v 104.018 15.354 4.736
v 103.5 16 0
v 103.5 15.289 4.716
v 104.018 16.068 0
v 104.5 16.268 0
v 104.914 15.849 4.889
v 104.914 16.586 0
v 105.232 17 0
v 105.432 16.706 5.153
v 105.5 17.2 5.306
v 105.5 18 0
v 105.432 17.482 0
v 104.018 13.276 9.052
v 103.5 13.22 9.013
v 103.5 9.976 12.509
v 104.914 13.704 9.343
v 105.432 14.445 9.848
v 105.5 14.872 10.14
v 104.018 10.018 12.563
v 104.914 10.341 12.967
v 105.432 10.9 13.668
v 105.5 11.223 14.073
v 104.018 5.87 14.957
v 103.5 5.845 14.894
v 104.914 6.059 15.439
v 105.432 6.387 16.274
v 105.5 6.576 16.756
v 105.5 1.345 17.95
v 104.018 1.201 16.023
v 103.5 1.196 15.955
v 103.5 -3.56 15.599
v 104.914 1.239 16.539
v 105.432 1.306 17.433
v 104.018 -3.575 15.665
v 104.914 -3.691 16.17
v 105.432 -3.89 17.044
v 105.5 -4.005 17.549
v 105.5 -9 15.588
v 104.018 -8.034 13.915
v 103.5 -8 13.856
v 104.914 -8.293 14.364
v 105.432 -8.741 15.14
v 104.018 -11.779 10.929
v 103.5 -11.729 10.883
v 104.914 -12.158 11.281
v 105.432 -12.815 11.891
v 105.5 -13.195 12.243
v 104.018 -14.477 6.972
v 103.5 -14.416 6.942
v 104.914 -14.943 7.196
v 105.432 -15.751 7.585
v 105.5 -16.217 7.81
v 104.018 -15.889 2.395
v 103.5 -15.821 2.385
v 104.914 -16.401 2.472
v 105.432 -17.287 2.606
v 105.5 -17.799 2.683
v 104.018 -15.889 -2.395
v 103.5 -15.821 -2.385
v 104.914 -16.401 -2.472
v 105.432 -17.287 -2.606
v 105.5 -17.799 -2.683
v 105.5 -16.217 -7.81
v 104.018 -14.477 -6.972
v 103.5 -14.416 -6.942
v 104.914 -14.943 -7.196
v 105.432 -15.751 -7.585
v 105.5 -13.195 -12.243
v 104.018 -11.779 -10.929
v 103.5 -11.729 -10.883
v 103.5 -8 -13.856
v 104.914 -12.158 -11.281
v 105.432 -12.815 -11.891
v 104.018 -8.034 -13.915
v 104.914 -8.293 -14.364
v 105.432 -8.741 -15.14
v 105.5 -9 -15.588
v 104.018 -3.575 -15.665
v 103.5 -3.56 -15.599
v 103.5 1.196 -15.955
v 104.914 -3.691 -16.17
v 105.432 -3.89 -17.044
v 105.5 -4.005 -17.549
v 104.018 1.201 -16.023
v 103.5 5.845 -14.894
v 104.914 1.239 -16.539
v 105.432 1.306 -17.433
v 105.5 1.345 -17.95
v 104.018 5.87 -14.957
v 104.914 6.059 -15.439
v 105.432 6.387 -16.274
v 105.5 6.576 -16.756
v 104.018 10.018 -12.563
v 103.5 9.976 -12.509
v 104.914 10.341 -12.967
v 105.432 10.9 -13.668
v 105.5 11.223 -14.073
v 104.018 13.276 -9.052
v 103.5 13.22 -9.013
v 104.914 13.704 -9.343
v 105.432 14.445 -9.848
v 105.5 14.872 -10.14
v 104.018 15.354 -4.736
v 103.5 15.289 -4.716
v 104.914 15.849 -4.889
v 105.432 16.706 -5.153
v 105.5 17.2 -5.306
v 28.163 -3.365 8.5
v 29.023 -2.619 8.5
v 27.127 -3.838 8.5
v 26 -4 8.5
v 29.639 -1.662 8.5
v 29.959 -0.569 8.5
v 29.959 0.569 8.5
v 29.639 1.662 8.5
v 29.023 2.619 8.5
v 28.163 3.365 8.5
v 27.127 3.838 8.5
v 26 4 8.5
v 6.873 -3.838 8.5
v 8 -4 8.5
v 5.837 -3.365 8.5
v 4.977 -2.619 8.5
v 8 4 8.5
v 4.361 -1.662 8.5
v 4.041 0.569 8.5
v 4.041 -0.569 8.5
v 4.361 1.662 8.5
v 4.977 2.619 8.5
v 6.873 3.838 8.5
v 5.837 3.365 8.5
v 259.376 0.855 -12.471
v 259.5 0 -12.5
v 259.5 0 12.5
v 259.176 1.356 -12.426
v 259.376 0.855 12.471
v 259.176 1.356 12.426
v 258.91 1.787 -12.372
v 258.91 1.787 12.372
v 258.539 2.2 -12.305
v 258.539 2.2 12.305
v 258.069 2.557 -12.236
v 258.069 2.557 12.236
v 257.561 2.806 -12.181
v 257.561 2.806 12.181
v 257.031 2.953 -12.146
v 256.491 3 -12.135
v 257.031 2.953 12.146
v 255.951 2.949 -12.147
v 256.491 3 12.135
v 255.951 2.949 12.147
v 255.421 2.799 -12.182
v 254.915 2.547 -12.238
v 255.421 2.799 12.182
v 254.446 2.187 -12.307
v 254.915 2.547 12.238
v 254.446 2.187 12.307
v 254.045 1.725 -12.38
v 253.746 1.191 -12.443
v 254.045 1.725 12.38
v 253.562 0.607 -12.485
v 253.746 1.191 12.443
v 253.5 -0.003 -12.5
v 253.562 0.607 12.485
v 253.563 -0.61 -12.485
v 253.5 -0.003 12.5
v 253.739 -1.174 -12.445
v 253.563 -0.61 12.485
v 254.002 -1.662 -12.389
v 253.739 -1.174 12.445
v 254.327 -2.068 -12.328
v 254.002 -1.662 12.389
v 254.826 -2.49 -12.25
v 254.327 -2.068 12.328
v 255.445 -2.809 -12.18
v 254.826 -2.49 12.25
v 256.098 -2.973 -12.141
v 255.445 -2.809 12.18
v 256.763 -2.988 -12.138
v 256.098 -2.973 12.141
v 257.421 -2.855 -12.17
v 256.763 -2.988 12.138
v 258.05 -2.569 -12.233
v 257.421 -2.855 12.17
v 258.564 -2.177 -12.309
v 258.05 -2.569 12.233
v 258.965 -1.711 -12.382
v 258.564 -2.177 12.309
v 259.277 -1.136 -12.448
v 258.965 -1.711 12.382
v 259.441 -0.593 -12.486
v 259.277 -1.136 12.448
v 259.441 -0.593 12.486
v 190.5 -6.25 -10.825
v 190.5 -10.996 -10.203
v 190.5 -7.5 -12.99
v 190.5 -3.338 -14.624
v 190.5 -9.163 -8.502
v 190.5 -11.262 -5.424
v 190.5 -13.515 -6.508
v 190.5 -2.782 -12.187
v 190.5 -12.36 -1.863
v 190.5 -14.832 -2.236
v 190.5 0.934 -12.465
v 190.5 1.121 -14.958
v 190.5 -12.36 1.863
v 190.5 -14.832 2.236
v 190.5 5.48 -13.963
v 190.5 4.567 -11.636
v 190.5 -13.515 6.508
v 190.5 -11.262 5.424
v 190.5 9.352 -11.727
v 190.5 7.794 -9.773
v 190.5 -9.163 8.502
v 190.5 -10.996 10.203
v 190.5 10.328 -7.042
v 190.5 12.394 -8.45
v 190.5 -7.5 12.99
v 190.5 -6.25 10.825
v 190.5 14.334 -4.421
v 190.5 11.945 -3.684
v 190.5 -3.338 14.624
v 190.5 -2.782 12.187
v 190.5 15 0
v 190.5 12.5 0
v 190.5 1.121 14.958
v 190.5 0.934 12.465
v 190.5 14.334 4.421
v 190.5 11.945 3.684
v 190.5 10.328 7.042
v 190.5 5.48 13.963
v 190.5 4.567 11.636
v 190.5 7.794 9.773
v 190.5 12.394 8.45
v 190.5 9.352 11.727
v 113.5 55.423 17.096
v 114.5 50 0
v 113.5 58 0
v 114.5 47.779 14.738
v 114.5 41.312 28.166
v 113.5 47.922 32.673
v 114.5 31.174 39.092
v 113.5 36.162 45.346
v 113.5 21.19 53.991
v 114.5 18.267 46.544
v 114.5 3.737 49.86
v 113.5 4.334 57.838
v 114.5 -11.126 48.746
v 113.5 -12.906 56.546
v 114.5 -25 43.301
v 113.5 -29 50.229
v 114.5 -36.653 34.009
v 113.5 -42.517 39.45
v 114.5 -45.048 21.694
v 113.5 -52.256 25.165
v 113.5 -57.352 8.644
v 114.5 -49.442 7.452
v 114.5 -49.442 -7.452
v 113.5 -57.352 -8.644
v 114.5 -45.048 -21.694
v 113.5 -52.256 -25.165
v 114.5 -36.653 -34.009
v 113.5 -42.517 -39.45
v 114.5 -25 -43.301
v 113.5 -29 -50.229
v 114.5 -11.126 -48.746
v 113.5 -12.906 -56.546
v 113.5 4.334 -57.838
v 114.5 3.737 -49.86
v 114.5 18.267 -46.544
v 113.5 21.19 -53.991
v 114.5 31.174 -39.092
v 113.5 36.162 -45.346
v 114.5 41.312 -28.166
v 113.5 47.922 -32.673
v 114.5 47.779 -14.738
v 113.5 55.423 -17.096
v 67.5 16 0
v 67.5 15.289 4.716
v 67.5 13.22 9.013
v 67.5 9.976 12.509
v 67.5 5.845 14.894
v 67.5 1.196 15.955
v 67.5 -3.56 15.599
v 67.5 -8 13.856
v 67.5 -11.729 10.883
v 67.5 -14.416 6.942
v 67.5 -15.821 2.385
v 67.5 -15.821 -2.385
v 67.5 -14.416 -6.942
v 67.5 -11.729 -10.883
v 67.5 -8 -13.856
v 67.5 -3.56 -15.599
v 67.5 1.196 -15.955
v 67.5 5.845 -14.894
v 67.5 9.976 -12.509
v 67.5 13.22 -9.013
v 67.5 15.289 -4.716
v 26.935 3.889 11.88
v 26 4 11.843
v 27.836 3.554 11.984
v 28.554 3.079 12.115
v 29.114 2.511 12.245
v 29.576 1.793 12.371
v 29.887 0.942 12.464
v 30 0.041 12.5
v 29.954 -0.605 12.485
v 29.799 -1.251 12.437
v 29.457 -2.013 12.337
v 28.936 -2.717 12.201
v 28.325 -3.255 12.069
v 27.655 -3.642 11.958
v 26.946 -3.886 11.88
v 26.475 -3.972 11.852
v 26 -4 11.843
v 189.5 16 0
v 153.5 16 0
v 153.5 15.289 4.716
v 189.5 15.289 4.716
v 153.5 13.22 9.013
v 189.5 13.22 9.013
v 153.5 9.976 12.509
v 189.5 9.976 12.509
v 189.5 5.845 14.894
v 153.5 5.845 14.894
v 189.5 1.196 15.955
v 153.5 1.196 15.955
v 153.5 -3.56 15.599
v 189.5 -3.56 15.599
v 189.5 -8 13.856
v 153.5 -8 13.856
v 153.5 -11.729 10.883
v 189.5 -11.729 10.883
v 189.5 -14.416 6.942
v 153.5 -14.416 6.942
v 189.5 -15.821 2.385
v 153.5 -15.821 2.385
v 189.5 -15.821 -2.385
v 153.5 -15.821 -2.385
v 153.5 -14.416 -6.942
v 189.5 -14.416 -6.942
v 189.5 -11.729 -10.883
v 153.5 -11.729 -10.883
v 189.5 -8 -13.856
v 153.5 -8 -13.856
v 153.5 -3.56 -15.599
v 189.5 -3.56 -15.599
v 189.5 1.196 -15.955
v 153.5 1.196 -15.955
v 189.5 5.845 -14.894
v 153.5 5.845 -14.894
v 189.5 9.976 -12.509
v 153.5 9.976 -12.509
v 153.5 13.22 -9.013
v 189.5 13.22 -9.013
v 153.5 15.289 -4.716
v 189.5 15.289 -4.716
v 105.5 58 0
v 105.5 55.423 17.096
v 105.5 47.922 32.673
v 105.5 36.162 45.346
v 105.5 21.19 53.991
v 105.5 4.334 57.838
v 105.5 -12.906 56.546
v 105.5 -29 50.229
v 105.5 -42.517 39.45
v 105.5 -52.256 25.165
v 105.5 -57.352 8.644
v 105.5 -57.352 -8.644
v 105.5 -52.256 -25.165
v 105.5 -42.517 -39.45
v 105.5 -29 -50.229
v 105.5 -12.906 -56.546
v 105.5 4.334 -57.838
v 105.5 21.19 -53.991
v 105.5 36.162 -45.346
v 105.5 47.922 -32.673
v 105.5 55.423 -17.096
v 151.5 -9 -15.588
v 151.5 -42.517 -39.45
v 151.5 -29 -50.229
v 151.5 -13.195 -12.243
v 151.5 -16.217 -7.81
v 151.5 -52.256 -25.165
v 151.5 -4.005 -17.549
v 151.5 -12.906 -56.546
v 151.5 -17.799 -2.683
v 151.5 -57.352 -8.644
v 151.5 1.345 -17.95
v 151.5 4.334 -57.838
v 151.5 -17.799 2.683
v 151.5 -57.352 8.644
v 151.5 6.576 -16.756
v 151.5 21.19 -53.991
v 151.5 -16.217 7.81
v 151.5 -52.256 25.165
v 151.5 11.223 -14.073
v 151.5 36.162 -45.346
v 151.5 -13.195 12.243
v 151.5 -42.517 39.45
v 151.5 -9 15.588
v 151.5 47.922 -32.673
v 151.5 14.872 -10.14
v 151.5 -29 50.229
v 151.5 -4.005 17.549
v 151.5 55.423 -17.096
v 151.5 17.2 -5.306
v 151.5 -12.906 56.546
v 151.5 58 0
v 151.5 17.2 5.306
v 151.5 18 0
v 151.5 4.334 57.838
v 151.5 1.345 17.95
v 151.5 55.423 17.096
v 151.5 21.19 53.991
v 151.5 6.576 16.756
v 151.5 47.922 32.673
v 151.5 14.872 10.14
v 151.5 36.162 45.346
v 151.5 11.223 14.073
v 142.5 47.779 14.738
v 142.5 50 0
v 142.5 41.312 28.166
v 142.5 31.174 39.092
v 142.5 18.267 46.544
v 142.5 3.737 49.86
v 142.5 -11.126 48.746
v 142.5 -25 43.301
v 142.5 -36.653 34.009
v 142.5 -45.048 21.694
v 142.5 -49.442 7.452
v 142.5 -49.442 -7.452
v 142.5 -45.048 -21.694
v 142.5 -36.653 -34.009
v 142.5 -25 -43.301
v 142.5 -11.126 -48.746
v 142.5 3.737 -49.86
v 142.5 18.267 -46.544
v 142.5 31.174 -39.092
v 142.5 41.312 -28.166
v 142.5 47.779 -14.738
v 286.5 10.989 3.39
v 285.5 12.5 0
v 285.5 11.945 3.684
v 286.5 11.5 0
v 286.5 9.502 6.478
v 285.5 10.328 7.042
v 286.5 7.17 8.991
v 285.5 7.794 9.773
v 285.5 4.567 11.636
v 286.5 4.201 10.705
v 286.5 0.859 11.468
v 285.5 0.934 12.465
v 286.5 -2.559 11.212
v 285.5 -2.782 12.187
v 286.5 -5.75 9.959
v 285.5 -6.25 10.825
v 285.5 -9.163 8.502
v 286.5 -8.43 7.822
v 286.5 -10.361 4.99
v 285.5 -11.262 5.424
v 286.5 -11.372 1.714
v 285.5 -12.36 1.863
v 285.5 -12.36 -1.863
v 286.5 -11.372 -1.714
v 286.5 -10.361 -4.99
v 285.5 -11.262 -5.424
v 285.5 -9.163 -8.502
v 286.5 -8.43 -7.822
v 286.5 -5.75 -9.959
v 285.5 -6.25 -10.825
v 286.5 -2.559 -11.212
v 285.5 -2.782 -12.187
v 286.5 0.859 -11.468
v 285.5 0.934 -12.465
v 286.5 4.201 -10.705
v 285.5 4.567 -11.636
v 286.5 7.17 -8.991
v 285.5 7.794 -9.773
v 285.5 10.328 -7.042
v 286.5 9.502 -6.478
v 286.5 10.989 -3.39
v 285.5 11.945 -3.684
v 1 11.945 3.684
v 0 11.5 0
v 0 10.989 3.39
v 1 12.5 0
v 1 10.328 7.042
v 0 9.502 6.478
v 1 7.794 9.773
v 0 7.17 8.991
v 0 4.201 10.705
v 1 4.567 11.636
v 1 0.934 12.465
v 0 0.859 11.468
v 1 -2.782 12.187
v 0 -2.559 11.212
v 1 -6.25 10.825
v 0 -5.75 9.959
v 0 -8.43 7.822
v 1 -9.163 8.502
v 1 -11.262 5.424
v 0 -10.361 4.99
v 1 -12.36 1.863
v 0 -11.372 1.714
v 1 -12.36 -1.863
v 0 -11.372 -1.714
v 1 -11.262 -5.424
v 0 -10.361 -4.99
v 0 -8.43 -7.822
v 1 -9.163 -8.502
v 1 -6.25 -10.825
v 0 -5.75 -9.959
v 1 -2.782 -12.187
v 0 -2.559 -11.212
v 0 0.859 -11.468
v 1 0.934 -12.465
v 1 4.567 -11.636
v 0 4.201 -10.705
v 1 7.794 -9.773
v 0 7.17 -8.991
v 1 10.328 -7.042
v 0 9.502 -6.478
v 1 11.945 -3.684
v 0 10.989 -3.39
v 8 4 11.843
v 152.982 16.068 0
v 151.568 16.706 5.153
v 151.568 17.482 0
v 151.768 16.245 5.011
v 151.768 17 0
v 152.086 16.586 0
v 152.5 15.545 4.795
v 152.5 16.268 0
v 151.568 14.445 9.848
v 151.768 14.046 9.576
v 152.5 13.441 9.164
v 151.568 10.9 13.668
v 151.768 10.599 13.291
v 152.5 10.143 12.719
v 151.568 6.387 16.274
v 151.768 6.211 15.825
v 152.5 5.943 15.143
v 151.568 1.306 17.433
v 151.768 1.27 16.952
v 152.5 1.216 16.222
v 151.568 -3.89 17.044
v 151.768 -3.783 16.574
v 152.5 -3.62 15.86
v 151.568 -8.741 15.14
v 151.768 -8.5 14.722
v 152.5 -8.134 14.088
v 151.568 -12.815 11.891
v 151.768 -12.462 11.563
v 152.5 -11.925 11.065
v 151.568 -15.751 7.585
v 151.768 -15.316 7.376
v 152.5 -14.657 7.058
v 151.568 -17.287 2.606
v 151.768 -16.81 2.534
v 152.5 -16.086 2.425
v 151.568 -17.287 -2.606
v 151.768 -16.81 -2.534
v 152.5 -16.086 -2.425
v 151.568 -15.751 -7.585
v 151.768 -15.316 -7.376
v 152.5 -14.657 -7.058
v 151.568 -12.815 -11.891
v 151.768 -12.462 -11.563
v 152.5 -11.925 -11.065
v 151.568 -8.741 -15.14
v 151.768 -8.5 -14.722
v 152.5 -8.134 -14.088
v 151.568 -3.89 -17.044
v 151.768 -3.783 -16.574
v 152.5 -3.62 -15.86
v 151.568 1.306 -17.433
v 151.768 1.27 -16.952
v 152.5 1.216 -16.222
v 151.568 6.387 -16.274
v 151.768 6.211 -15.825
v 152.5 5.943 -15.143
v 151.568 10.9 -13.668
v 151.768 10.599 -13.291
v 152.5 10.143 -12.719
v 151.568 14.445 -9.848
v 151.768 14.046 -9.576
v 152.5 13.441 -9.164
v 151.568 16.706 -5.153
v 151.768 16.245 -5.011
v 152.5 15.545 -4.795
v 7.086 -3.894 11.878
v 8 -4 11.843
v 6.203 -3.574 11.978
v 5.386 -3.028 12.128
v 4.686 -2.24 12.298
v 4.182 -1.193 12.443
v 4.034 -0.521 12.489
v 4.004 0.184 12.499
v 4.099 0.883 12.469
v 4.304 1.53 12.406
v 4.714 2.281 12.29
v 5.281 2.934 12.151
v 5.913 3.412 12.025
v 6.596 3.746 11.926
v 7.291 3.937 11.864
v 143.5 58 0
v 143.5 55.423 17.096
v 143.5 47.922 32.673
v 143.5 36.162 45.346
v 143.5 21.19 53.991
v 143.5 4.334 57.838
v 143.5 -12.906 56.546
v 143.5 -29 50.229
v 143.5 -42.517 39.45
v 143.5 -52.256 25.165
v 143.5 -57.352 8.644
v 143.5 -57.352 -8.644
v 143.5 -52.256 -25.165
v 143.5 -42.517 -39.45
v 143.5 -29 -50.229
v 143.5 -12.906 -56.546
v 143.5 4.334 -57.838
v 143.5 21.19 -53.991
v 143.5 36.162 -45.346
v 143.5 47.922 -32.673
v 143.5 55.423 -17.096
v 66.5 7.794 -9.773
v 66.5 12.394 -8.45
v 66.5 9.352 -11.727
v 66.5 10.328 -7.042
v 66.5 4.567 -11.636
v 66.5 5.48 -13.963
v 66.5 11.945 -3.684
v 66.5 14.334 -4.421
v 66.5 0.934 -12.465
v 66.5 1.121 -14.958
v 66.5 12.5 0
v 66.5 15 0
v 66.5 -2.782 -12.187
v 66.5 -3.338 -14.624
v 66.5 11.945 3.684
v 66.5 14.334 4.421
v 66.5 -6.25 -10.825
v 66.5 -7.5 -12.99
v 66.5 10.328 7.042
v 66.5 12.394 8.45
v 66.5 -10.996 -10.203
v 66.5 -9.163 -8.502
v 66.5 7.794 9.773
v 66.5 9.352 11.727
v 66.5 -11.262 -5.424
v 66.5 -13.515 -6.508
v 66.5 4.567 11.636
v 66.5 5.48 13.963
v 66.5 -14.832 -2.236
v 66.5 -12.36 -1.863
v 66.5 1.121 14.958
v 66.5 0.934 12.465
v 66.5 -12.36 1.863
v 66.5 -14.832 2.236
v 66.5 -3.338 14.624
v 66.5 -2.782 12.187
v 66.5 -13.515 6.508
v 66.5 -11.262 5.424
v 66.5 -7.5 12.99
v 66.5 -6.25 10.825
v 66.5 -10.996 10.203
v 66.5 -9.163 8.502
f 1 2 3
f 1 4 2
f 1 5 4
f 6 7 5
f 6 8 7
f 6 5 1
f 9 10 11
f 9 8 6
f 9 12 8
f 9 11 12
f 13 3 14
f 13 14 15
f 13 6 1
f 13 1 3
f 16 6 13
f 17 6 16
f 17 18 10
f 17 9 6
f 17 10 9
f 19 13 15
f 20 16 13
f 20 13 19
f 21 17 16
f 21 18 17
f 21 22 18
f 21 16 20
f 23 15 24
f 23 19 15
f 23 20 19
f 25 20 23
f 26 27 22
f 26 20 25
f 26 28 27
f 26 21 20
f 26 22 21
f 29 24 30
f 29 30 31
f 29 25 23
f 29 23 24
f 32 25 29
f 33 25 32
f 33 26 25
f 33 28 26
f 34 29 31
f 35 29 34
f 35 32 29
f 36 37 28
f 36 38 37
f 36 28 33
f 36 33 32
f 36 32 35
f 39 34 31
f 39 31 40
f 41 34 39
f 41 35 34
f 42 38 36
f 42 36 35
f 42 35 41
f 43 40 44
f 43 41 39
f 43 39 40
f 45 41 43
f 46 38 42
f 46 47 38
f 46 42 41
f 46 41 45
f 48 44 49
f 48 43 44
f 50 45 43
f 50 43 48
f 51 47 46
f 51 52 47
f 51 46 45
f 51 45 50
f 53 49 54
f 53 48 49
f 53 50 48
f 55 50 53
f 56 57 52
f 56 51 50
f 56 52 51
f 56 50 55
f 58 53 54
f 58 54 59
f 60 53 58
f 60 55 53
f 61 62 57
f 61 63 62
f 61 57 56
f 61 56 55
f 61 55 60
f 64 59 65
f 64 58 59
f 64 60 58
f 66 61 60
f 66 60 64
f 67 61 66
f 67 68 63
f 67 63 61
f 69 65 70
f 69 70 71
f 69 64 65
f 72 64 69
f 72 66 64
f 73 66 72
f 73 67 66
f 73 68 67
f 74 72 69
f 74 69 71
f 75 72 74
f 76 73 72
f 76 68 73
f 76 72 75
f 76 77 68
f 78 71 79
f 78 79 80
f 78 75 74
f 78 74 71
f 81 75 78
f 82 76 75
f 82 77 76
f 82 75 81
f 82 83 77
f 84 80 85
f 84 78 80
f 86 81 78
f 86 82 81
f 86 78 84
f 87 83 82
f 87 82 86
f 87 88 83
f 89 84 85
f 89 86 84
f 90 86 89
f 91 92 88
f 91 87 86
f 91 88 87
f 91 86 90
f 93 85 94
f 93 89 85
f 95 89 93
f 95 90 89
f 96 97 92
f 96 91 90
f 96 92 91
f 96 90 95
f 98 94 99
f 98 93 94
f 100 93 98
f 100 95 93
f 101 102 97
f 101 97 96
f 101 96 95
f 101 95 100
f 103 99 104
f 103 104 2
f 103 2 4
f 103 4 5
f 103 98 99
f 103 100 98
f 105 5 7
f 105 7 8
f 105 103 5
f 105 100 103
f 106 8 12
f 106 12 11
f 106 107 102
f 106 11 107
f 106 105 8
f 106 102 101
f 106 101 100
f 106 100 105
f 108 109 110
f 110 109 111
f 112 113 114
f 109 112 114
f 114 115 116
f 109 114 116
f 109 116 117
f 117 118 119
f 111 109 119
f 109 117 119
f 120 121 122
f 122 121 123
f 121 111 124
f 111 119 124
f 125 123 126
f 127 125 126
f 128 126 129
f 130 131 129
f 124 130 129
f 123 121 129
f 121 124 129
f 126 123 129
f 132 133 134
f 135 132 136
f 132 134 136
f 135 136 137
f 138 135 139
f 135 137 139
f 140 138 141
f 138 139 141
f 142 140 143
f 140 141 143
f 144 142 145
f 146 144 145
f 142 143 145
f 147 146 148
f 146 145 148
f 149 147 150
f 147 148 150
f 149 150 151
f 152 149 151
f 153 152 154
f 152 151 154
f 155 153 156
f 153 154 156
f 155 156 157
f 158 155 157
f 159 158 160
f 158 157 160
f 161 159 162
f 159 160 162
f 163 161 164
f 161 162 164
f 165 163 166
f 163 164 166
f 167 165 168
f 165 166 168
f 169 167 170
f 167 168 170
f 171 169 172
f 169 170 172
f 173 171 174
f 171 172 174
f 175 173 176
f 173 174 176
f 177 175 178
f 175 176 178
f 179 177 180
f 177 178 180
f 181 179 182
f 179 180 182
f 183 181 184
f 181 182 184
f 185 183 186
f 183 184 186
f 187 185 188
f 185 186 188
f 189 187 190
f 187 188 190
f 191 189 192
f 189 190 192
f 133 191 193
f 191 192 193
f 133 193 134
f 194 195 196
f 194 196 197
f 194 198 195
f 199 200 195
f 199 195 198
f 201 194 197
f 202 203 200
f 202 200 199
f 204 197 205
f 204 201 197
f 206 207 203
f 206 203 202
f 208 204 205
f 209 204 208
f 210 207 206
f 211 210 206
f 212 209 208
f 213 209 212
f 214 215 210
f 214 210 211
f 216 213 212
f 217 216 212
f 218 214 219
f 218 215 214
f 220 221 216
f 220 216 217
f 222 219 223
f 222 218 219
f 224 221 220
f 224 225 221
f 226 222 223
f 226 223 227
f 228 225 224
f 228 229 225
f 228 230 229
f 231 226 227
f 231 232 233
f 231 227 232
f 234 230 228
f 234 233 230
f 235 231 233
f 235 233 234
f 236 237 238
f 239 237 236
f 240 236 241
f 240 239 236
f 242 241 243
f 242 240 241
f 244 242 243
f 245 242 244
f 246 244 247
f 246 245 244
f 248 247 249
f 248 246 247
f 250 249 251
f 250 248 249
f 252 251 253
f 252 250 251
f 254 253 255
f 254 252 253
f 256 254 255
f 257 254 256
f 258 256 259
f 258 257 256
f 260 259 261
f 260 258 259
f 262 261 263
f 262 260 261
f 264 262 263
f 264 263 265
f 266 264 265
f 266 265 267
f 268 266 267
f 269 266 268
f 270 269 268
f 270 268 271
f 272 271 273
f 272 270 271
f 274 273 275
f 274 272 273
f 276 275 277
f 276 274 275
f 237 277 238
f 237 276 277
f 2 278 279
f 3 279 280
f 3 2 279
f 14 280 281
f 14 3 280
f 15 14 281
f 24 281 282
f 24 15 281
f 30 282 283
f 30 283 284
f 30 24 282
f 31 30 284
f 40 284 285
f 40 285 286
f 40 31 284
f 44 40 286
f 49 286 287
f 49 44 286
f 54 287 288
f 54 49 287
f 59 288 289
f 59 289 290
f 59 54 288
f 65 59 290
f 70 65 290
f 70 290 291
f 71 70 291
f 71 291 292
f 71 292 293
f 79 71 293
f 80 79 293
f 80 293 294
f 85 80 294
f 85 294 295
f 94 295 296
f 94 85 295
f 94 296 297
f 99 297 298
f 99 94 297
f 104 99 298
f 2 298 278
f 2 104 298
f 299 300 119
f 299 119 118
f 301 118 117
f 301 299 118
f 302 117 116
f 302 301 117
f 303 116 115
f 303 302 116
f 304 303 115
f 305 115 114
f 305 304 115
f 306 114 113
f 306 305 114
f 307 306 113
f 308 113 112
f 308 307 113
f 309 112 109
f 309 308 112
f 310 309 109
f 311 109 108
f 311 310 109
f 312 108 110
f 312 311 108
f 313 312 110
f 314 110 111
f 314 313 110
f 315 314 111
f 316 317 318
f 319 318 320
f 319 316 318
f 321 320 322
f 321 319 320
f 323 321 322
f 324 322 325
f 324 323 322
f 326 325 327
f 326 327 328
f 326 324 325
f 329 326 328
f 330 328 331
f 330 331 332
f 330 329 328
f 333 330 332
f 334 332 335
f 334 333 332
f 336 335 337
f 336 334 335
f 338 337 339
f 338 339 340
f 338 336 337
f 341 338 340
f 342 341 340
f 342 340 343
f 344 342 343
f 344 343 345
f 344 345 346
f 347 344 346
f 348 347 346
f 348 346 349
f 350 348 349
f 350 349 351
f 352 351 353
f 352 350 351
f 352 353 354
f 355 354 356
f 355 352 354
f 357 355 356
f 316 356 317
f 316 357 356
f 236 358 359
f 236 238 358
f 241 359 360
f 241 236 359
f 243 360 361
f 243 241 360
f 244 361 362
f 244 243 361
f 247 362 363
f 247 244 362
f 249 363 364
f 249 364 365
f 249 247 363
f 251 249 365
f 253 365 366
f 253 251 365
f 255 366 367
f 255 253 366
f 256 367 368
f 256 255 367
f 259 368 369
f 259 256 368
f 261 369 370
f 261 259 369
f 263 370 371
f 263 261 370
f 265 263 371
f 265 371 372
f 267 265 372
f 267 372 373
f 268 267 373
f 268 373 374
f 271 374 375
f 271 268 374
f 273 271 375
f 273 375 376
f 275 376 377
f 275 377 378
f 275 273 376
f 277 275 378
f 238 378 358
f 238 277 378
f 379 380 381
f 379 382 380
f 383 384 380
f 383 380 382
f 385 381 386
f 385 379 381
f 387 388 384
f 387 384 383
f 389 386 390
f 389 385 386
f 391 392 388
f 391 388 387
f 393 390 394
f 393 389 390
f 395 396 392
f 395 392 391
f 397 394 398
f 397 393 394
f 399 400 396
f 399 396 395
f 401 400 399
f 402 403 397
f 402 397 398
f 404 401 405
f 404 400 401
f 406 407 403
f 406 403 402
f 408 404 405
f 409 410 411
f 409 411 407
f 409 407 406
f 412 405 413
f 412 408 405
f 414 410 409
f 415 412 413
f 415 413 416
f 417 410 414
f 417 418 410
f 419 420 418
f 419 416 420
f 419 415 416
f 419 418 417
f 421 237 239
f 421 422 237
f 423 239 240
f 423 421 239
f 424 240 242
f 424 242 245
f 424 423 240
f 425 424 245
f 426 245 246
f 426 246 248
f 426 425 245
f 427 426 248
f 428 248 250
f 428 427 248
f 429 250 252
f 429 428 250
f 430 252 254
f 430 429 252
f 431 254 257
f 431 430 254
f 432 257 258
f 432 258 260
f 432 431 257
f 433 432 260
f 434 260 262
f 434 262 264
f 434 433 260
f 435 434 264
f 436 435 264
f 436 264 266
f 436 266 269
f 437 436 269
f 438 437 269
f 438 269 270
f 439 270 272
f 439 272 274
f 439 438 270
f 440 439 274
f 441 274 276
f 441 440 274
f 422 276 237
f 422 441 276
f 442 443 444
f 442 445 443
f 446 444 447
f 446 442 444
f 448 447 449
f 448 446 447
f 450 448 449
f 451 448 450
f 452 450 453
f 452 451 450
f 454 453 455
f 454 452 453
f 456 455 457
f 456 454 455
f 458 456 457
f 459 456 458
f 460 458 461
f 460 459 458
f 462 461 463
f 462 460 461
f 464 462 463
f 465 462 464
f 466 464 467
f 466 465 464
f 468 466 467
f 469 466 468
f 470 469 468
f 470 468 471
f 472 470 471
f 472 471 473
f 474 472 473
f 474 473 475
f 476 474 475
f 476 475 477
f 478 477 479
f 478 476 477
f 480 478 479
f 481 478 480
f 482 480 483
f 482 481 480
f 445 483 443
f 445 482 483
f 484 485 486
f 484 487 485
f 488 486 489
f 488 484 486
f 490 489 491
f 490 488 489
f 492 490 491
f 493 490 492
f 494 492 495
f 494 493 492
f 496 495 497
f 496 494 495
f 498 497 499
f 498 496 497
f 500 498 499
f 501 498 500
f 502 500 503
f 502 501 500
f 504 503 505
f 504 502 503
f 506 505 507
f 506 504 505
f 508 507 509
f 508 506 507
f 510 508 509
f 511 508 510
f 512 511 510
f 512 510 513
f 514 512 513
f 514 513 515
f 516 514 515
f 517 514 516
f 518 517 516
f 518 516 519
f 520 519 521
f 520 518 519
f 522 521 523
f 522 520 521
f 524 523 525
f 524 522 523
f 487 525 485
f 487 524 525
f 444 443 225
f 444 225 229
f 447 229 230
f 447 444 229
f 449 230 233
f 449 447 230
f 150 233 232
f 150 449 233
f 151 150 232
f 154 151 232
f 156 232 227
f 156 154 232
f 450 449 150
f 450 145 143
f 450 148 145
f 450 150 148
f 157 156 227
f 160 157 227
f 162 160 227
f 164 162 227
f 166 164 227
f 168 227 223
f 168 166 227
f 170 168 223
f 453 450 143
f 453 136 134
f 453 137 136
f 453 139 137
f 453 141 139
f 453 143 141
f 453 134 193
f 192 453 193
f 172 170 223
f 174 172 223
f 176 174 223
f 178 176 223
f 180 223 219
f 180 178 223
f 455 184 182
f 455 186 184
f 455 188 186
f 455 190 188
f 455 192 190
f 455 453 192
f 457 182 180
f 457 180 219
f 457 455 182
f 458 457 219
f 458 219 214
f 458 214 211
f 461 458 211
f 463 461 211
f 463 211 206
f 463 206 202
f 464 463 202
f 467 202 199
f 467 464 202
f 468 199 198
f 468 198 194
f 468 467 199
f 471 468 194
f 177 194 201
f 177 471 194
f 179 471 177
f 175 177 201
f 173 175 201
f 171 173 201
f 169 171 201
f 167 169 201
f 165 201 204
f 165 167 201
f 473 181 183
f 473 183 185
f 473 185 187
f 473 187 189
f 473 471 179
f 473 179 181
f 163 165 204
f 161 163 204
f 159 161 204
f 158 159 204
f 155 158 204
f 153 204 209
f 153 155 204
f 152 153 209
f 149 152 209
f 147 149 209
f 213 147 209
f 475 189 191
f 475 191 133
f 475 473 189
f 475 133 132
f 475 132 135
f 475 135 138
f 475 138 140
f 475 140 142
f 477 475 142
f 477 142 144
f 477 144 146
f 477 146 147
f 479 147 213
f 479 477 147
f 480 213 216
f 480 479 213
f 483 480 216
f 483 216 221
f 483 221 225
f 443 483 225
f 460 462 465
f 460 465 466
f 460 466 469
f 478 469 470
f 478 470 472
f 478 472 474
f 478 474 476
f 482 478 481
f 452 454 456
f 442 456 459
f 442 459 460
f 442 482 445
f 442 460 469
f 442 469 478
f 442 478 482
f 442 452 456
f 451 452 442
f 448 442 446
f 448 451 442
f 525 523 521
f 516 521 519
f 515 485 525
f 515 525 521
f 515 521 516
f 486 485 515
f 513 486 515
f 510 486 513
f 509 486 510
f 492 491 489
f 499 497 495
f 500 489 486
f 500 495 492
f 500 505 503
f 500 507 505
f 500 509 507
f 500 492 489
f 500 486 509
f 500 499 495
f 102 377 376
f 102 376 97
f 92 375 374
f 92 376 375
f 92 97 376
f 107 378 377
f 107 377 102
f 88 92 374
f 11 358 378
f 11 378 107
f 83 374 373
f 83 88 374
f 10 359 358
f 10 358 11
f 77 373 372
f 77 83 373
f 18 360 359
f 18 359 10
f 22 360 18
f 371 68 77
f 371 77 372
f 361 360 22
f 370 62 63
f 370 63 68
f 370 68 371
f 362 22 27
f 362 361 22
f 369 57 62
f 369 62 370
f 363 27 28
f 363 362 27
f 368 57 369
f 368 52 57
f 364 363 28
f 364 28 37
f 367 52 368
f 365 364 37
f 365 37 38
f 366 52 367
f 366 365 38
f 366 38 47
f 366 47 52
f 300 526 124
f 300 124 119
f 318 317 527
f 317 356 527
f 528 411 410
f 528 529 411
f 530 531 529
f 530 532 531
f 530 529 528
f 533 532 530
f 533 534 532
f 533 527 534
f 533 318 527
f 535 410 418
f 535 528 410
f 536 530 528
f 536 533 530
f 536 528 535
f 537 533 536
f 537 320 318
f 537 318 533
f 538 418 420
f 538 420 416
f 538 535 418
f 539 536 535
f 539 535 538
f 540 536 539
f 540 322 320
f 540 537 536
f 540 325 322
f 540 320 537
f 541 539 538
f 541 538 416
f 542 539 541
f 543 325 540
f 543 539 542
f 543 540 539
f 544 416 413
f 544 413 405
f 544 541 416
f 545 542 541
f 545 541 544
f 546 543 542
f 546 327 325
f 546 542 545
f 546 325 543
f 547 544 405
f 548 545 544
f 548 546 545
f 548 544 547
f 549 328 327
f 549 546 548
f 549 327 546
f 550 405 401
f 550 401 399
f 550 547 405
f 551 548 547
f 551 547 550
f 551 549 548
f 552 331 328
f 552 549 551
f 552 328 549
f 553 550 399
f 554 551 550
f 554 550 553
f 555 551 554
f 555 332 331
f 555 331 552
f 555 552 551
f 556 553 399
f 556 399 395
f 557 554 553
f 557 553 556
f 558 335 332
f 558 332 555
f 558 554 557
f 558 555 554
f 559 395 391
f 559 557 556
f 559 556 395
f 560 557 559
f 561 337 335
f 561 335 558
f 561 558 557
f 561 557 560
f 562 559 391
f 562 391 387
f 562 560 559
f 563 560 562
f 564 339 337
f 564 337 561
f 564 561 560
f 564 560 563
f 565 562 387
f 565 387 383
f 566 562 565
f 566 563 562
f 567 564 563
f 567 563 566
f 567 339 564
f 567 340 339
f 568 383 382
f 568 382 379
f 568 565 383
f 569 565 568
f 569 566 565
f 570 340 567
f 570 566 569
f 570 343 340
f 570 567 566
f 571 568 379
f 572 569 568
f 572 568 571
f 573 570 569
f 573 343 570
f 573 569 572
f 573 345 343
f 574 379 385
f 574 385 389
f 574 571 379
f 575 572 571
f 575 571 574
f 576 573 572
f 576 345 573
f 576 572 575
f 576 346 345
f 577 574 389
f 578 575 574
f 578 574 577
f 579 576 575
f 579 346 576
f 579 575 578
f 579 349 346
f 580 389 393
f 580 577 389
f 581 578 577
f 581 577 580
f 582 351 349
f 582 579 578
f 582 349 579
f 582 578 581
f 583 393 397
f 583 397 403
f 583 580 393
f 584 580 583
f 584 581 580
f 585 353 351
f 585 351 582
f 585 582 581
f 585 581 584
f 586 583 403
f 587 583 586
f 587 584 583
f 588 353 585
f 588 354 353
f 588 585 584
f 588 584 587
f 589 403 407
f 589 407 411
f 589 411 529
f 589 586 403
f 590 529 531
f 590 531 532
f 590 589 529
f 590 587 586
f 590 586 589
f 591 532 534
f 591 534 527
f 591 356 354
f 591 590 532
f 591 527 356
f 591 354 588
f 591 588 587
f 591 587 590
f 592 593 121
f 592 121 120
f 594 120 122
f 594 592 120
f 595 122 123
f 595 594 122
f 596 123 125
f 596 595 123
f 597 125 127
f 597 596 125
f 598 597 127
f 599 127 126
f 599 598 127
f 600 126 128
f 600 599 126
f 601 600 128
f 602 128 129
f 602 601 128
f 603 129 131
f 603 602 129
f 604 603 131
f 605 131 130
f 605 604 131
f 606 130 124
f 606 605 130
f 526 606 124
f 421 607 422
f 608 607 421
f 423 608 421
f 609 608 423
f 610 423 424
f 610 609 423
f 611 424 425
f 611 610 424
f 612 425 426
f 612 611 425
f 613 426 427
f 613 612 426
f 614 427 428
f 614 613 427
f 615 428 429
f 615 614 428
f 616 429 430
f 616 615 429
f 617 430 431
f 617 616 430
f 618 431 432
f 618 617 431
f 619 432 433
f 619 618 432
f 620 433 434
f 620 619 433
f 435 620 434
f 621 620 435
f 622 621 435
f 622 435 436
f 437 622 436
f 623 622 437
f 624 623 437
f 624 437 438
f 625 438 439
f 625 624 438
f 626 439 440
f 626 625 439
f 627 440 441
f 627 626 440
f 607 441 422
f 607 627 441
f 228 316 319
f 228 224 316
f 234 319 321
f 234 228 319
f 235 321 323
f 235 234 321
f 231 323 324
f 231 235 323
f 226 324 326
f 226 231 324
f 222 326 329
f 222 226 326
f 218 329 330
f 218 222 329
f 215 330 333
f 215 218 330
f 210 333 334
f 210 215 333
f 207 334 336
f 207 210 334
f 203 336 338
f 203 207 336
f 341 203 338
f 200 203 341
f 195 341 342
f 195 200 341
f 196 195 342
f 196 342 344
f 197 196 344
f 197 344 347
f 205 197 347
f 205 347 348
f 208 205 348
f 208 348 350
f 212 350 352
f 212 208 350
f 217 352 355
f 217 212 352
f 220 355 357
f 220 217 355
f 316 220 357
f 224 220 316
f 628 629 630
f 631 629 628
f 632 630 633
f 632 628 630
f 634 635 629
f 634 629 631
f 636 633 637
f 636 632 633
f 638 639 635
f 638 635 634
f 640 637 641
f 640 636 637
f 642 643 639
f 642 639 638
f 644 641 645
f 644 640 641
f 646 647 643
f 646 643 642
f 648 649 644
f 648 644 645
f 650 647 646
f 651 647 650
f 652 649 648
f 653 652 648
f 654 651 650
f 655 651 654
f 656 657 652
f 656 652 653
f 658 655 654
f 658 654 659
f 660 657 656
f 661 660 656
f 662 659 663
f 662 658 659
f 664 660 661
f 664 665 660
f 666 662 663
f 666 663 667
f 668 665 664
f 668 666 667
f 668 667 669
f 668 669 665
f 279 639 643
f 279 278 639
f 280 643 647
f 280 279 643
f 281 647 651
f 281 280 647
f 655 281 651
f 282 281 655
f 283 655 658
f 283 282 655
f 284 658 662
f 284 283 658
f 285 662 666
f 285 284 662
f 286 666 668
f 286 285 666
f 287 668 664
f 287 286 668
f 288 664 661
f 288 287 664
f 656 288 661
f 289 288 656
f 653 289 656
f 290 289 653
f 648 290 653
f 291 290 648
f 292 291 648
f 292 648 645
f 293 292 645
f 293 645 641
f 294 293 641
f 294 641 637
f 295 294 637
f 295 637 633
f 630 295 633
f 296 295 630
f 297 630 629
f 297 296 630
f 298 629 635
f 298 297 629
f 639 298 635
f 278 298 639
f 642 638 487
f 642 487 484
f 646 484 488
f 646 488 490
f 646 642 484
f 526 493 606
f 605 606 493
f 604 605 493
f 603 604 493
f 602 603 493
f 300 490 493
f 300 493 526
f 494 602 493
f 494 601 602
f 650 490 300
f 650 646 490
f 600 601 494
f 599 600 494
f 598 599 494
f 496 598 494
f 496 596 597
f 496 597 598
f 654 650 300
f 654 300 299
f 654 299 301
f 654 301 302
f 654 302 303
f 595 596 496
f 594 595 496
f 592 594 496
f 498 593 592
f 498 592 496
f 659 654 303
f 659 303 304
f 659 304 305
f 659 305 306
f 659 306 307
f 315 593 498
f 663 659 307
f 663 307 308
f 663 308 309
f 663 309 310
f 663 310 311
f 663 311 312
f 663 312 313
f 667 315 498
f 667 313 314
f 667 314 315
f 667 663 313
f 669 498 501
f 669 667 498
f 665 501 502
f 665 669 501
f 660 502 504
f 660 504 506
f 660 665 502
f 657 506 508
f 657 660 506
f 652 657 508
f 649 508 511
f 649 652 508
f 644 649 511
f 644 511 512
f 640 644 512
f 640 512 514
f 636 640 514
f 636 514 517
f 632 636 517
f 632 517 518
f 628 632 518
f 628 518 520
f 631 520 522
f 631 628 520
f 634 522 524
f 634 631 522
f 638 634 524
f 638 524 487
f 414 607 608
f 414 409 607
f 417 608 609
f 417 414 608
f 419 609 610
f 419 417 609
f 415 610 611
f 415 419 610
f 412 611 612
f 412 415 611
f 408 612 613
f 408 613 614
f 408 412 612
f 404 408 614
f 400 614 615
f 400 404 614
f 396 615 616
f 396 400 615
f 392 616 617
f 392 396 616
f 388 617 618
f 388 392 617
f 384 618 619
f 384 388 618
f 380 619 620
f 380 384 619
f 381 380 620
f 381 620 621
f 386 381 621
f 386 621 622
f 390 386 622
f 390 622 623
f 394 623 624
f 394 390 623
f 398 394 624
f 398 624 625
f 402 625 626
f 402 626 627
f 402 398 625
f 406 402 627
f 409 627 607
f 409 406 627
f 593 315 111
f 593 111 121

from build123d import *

# Parameters (mm, degrees)
SKETCH_2_R          = 3
CUT_EXTRUDE_1_DEPTH = 15
CUT_EXTRUDE_2_DEPTH = 4


with BuildPart() as part:
    # 草图1 → 旋转1 (revolve)
    with BuildSketch(Plane.XY):
        with BuildLine():
            Line((67.5, 16), (103.5, 16))
            ThreePointArc((103.5, 16), (104.914213562, 16.585786438), (105.5, 18))
            Line((105.5, 18), (105.5, 58))
            Line((105.5, 58), (113.5, 58))
            Line((113.5, 58), (114.5, 50))
            Line((114.5, 50), (142.5, 50))
            Line((142.5, 50), (143.5, 58))
            Line((143.5, 58), (151.5, 58))
            Line((151.5, 58), (151.5, 18))
            ThreePointArc((151.5, 18), (152.085786438, 16.585786438), (153.5, 16))
            Line((153.5, 16), (189.5, 16))
            Line((189.5, 16), (190.5, 15))
            Line((190.5, 15), (190.5, 12.5))
            Line((190.5, 12.5), (285.5, 12.5))
            Line((285.5, 12.5), (286.5, 11.5))
            Line((286.5, 11.5), (286.5, 0))
            Line((286.5, 0), (0, 0))
            Line((0, 0), (0, 11.5))
            Line((0, 11.5), (1, 12.5))
            Line((1, 12.5), (66.5, 12.5))
            Line((66.5, 12.5), (66.5, 15))
            Line((66.5, 15), (67.5, 16))
        make_face()
    revolve(axis=Axis((0, 0, 0), (1, 0, 0)))

    # 草图2 → 切除-拉伸1 (cut, symmetric)
    with BuildSketch(Plane.XY):
        with Locations((256.5, 0)):
            Circle(SKETCH_2_R)
    extrude(amount=CUT_EXTRUDE_1_DEPTH, both=True, mode=Mode.SUBTRACT)

    # 草图3 → 切除-拉伸2 (cut)
    with BuildSketch(Plane.XY.offset(12.5)):
        with BuildLine():
            Line((8, 4), (26, 4))
            ThreePointArc((26, 4), (30, 0), (26, -4))
            Line((26, -4), (8, -4))
            ThreePointArc((8, -4), (4, 0), (8, 4))
        make_face()
    extrude(amount=-CUT_EXTRUDE_2_DEPTH, mode=Mode.SUBTRACT)


solid = part.part
